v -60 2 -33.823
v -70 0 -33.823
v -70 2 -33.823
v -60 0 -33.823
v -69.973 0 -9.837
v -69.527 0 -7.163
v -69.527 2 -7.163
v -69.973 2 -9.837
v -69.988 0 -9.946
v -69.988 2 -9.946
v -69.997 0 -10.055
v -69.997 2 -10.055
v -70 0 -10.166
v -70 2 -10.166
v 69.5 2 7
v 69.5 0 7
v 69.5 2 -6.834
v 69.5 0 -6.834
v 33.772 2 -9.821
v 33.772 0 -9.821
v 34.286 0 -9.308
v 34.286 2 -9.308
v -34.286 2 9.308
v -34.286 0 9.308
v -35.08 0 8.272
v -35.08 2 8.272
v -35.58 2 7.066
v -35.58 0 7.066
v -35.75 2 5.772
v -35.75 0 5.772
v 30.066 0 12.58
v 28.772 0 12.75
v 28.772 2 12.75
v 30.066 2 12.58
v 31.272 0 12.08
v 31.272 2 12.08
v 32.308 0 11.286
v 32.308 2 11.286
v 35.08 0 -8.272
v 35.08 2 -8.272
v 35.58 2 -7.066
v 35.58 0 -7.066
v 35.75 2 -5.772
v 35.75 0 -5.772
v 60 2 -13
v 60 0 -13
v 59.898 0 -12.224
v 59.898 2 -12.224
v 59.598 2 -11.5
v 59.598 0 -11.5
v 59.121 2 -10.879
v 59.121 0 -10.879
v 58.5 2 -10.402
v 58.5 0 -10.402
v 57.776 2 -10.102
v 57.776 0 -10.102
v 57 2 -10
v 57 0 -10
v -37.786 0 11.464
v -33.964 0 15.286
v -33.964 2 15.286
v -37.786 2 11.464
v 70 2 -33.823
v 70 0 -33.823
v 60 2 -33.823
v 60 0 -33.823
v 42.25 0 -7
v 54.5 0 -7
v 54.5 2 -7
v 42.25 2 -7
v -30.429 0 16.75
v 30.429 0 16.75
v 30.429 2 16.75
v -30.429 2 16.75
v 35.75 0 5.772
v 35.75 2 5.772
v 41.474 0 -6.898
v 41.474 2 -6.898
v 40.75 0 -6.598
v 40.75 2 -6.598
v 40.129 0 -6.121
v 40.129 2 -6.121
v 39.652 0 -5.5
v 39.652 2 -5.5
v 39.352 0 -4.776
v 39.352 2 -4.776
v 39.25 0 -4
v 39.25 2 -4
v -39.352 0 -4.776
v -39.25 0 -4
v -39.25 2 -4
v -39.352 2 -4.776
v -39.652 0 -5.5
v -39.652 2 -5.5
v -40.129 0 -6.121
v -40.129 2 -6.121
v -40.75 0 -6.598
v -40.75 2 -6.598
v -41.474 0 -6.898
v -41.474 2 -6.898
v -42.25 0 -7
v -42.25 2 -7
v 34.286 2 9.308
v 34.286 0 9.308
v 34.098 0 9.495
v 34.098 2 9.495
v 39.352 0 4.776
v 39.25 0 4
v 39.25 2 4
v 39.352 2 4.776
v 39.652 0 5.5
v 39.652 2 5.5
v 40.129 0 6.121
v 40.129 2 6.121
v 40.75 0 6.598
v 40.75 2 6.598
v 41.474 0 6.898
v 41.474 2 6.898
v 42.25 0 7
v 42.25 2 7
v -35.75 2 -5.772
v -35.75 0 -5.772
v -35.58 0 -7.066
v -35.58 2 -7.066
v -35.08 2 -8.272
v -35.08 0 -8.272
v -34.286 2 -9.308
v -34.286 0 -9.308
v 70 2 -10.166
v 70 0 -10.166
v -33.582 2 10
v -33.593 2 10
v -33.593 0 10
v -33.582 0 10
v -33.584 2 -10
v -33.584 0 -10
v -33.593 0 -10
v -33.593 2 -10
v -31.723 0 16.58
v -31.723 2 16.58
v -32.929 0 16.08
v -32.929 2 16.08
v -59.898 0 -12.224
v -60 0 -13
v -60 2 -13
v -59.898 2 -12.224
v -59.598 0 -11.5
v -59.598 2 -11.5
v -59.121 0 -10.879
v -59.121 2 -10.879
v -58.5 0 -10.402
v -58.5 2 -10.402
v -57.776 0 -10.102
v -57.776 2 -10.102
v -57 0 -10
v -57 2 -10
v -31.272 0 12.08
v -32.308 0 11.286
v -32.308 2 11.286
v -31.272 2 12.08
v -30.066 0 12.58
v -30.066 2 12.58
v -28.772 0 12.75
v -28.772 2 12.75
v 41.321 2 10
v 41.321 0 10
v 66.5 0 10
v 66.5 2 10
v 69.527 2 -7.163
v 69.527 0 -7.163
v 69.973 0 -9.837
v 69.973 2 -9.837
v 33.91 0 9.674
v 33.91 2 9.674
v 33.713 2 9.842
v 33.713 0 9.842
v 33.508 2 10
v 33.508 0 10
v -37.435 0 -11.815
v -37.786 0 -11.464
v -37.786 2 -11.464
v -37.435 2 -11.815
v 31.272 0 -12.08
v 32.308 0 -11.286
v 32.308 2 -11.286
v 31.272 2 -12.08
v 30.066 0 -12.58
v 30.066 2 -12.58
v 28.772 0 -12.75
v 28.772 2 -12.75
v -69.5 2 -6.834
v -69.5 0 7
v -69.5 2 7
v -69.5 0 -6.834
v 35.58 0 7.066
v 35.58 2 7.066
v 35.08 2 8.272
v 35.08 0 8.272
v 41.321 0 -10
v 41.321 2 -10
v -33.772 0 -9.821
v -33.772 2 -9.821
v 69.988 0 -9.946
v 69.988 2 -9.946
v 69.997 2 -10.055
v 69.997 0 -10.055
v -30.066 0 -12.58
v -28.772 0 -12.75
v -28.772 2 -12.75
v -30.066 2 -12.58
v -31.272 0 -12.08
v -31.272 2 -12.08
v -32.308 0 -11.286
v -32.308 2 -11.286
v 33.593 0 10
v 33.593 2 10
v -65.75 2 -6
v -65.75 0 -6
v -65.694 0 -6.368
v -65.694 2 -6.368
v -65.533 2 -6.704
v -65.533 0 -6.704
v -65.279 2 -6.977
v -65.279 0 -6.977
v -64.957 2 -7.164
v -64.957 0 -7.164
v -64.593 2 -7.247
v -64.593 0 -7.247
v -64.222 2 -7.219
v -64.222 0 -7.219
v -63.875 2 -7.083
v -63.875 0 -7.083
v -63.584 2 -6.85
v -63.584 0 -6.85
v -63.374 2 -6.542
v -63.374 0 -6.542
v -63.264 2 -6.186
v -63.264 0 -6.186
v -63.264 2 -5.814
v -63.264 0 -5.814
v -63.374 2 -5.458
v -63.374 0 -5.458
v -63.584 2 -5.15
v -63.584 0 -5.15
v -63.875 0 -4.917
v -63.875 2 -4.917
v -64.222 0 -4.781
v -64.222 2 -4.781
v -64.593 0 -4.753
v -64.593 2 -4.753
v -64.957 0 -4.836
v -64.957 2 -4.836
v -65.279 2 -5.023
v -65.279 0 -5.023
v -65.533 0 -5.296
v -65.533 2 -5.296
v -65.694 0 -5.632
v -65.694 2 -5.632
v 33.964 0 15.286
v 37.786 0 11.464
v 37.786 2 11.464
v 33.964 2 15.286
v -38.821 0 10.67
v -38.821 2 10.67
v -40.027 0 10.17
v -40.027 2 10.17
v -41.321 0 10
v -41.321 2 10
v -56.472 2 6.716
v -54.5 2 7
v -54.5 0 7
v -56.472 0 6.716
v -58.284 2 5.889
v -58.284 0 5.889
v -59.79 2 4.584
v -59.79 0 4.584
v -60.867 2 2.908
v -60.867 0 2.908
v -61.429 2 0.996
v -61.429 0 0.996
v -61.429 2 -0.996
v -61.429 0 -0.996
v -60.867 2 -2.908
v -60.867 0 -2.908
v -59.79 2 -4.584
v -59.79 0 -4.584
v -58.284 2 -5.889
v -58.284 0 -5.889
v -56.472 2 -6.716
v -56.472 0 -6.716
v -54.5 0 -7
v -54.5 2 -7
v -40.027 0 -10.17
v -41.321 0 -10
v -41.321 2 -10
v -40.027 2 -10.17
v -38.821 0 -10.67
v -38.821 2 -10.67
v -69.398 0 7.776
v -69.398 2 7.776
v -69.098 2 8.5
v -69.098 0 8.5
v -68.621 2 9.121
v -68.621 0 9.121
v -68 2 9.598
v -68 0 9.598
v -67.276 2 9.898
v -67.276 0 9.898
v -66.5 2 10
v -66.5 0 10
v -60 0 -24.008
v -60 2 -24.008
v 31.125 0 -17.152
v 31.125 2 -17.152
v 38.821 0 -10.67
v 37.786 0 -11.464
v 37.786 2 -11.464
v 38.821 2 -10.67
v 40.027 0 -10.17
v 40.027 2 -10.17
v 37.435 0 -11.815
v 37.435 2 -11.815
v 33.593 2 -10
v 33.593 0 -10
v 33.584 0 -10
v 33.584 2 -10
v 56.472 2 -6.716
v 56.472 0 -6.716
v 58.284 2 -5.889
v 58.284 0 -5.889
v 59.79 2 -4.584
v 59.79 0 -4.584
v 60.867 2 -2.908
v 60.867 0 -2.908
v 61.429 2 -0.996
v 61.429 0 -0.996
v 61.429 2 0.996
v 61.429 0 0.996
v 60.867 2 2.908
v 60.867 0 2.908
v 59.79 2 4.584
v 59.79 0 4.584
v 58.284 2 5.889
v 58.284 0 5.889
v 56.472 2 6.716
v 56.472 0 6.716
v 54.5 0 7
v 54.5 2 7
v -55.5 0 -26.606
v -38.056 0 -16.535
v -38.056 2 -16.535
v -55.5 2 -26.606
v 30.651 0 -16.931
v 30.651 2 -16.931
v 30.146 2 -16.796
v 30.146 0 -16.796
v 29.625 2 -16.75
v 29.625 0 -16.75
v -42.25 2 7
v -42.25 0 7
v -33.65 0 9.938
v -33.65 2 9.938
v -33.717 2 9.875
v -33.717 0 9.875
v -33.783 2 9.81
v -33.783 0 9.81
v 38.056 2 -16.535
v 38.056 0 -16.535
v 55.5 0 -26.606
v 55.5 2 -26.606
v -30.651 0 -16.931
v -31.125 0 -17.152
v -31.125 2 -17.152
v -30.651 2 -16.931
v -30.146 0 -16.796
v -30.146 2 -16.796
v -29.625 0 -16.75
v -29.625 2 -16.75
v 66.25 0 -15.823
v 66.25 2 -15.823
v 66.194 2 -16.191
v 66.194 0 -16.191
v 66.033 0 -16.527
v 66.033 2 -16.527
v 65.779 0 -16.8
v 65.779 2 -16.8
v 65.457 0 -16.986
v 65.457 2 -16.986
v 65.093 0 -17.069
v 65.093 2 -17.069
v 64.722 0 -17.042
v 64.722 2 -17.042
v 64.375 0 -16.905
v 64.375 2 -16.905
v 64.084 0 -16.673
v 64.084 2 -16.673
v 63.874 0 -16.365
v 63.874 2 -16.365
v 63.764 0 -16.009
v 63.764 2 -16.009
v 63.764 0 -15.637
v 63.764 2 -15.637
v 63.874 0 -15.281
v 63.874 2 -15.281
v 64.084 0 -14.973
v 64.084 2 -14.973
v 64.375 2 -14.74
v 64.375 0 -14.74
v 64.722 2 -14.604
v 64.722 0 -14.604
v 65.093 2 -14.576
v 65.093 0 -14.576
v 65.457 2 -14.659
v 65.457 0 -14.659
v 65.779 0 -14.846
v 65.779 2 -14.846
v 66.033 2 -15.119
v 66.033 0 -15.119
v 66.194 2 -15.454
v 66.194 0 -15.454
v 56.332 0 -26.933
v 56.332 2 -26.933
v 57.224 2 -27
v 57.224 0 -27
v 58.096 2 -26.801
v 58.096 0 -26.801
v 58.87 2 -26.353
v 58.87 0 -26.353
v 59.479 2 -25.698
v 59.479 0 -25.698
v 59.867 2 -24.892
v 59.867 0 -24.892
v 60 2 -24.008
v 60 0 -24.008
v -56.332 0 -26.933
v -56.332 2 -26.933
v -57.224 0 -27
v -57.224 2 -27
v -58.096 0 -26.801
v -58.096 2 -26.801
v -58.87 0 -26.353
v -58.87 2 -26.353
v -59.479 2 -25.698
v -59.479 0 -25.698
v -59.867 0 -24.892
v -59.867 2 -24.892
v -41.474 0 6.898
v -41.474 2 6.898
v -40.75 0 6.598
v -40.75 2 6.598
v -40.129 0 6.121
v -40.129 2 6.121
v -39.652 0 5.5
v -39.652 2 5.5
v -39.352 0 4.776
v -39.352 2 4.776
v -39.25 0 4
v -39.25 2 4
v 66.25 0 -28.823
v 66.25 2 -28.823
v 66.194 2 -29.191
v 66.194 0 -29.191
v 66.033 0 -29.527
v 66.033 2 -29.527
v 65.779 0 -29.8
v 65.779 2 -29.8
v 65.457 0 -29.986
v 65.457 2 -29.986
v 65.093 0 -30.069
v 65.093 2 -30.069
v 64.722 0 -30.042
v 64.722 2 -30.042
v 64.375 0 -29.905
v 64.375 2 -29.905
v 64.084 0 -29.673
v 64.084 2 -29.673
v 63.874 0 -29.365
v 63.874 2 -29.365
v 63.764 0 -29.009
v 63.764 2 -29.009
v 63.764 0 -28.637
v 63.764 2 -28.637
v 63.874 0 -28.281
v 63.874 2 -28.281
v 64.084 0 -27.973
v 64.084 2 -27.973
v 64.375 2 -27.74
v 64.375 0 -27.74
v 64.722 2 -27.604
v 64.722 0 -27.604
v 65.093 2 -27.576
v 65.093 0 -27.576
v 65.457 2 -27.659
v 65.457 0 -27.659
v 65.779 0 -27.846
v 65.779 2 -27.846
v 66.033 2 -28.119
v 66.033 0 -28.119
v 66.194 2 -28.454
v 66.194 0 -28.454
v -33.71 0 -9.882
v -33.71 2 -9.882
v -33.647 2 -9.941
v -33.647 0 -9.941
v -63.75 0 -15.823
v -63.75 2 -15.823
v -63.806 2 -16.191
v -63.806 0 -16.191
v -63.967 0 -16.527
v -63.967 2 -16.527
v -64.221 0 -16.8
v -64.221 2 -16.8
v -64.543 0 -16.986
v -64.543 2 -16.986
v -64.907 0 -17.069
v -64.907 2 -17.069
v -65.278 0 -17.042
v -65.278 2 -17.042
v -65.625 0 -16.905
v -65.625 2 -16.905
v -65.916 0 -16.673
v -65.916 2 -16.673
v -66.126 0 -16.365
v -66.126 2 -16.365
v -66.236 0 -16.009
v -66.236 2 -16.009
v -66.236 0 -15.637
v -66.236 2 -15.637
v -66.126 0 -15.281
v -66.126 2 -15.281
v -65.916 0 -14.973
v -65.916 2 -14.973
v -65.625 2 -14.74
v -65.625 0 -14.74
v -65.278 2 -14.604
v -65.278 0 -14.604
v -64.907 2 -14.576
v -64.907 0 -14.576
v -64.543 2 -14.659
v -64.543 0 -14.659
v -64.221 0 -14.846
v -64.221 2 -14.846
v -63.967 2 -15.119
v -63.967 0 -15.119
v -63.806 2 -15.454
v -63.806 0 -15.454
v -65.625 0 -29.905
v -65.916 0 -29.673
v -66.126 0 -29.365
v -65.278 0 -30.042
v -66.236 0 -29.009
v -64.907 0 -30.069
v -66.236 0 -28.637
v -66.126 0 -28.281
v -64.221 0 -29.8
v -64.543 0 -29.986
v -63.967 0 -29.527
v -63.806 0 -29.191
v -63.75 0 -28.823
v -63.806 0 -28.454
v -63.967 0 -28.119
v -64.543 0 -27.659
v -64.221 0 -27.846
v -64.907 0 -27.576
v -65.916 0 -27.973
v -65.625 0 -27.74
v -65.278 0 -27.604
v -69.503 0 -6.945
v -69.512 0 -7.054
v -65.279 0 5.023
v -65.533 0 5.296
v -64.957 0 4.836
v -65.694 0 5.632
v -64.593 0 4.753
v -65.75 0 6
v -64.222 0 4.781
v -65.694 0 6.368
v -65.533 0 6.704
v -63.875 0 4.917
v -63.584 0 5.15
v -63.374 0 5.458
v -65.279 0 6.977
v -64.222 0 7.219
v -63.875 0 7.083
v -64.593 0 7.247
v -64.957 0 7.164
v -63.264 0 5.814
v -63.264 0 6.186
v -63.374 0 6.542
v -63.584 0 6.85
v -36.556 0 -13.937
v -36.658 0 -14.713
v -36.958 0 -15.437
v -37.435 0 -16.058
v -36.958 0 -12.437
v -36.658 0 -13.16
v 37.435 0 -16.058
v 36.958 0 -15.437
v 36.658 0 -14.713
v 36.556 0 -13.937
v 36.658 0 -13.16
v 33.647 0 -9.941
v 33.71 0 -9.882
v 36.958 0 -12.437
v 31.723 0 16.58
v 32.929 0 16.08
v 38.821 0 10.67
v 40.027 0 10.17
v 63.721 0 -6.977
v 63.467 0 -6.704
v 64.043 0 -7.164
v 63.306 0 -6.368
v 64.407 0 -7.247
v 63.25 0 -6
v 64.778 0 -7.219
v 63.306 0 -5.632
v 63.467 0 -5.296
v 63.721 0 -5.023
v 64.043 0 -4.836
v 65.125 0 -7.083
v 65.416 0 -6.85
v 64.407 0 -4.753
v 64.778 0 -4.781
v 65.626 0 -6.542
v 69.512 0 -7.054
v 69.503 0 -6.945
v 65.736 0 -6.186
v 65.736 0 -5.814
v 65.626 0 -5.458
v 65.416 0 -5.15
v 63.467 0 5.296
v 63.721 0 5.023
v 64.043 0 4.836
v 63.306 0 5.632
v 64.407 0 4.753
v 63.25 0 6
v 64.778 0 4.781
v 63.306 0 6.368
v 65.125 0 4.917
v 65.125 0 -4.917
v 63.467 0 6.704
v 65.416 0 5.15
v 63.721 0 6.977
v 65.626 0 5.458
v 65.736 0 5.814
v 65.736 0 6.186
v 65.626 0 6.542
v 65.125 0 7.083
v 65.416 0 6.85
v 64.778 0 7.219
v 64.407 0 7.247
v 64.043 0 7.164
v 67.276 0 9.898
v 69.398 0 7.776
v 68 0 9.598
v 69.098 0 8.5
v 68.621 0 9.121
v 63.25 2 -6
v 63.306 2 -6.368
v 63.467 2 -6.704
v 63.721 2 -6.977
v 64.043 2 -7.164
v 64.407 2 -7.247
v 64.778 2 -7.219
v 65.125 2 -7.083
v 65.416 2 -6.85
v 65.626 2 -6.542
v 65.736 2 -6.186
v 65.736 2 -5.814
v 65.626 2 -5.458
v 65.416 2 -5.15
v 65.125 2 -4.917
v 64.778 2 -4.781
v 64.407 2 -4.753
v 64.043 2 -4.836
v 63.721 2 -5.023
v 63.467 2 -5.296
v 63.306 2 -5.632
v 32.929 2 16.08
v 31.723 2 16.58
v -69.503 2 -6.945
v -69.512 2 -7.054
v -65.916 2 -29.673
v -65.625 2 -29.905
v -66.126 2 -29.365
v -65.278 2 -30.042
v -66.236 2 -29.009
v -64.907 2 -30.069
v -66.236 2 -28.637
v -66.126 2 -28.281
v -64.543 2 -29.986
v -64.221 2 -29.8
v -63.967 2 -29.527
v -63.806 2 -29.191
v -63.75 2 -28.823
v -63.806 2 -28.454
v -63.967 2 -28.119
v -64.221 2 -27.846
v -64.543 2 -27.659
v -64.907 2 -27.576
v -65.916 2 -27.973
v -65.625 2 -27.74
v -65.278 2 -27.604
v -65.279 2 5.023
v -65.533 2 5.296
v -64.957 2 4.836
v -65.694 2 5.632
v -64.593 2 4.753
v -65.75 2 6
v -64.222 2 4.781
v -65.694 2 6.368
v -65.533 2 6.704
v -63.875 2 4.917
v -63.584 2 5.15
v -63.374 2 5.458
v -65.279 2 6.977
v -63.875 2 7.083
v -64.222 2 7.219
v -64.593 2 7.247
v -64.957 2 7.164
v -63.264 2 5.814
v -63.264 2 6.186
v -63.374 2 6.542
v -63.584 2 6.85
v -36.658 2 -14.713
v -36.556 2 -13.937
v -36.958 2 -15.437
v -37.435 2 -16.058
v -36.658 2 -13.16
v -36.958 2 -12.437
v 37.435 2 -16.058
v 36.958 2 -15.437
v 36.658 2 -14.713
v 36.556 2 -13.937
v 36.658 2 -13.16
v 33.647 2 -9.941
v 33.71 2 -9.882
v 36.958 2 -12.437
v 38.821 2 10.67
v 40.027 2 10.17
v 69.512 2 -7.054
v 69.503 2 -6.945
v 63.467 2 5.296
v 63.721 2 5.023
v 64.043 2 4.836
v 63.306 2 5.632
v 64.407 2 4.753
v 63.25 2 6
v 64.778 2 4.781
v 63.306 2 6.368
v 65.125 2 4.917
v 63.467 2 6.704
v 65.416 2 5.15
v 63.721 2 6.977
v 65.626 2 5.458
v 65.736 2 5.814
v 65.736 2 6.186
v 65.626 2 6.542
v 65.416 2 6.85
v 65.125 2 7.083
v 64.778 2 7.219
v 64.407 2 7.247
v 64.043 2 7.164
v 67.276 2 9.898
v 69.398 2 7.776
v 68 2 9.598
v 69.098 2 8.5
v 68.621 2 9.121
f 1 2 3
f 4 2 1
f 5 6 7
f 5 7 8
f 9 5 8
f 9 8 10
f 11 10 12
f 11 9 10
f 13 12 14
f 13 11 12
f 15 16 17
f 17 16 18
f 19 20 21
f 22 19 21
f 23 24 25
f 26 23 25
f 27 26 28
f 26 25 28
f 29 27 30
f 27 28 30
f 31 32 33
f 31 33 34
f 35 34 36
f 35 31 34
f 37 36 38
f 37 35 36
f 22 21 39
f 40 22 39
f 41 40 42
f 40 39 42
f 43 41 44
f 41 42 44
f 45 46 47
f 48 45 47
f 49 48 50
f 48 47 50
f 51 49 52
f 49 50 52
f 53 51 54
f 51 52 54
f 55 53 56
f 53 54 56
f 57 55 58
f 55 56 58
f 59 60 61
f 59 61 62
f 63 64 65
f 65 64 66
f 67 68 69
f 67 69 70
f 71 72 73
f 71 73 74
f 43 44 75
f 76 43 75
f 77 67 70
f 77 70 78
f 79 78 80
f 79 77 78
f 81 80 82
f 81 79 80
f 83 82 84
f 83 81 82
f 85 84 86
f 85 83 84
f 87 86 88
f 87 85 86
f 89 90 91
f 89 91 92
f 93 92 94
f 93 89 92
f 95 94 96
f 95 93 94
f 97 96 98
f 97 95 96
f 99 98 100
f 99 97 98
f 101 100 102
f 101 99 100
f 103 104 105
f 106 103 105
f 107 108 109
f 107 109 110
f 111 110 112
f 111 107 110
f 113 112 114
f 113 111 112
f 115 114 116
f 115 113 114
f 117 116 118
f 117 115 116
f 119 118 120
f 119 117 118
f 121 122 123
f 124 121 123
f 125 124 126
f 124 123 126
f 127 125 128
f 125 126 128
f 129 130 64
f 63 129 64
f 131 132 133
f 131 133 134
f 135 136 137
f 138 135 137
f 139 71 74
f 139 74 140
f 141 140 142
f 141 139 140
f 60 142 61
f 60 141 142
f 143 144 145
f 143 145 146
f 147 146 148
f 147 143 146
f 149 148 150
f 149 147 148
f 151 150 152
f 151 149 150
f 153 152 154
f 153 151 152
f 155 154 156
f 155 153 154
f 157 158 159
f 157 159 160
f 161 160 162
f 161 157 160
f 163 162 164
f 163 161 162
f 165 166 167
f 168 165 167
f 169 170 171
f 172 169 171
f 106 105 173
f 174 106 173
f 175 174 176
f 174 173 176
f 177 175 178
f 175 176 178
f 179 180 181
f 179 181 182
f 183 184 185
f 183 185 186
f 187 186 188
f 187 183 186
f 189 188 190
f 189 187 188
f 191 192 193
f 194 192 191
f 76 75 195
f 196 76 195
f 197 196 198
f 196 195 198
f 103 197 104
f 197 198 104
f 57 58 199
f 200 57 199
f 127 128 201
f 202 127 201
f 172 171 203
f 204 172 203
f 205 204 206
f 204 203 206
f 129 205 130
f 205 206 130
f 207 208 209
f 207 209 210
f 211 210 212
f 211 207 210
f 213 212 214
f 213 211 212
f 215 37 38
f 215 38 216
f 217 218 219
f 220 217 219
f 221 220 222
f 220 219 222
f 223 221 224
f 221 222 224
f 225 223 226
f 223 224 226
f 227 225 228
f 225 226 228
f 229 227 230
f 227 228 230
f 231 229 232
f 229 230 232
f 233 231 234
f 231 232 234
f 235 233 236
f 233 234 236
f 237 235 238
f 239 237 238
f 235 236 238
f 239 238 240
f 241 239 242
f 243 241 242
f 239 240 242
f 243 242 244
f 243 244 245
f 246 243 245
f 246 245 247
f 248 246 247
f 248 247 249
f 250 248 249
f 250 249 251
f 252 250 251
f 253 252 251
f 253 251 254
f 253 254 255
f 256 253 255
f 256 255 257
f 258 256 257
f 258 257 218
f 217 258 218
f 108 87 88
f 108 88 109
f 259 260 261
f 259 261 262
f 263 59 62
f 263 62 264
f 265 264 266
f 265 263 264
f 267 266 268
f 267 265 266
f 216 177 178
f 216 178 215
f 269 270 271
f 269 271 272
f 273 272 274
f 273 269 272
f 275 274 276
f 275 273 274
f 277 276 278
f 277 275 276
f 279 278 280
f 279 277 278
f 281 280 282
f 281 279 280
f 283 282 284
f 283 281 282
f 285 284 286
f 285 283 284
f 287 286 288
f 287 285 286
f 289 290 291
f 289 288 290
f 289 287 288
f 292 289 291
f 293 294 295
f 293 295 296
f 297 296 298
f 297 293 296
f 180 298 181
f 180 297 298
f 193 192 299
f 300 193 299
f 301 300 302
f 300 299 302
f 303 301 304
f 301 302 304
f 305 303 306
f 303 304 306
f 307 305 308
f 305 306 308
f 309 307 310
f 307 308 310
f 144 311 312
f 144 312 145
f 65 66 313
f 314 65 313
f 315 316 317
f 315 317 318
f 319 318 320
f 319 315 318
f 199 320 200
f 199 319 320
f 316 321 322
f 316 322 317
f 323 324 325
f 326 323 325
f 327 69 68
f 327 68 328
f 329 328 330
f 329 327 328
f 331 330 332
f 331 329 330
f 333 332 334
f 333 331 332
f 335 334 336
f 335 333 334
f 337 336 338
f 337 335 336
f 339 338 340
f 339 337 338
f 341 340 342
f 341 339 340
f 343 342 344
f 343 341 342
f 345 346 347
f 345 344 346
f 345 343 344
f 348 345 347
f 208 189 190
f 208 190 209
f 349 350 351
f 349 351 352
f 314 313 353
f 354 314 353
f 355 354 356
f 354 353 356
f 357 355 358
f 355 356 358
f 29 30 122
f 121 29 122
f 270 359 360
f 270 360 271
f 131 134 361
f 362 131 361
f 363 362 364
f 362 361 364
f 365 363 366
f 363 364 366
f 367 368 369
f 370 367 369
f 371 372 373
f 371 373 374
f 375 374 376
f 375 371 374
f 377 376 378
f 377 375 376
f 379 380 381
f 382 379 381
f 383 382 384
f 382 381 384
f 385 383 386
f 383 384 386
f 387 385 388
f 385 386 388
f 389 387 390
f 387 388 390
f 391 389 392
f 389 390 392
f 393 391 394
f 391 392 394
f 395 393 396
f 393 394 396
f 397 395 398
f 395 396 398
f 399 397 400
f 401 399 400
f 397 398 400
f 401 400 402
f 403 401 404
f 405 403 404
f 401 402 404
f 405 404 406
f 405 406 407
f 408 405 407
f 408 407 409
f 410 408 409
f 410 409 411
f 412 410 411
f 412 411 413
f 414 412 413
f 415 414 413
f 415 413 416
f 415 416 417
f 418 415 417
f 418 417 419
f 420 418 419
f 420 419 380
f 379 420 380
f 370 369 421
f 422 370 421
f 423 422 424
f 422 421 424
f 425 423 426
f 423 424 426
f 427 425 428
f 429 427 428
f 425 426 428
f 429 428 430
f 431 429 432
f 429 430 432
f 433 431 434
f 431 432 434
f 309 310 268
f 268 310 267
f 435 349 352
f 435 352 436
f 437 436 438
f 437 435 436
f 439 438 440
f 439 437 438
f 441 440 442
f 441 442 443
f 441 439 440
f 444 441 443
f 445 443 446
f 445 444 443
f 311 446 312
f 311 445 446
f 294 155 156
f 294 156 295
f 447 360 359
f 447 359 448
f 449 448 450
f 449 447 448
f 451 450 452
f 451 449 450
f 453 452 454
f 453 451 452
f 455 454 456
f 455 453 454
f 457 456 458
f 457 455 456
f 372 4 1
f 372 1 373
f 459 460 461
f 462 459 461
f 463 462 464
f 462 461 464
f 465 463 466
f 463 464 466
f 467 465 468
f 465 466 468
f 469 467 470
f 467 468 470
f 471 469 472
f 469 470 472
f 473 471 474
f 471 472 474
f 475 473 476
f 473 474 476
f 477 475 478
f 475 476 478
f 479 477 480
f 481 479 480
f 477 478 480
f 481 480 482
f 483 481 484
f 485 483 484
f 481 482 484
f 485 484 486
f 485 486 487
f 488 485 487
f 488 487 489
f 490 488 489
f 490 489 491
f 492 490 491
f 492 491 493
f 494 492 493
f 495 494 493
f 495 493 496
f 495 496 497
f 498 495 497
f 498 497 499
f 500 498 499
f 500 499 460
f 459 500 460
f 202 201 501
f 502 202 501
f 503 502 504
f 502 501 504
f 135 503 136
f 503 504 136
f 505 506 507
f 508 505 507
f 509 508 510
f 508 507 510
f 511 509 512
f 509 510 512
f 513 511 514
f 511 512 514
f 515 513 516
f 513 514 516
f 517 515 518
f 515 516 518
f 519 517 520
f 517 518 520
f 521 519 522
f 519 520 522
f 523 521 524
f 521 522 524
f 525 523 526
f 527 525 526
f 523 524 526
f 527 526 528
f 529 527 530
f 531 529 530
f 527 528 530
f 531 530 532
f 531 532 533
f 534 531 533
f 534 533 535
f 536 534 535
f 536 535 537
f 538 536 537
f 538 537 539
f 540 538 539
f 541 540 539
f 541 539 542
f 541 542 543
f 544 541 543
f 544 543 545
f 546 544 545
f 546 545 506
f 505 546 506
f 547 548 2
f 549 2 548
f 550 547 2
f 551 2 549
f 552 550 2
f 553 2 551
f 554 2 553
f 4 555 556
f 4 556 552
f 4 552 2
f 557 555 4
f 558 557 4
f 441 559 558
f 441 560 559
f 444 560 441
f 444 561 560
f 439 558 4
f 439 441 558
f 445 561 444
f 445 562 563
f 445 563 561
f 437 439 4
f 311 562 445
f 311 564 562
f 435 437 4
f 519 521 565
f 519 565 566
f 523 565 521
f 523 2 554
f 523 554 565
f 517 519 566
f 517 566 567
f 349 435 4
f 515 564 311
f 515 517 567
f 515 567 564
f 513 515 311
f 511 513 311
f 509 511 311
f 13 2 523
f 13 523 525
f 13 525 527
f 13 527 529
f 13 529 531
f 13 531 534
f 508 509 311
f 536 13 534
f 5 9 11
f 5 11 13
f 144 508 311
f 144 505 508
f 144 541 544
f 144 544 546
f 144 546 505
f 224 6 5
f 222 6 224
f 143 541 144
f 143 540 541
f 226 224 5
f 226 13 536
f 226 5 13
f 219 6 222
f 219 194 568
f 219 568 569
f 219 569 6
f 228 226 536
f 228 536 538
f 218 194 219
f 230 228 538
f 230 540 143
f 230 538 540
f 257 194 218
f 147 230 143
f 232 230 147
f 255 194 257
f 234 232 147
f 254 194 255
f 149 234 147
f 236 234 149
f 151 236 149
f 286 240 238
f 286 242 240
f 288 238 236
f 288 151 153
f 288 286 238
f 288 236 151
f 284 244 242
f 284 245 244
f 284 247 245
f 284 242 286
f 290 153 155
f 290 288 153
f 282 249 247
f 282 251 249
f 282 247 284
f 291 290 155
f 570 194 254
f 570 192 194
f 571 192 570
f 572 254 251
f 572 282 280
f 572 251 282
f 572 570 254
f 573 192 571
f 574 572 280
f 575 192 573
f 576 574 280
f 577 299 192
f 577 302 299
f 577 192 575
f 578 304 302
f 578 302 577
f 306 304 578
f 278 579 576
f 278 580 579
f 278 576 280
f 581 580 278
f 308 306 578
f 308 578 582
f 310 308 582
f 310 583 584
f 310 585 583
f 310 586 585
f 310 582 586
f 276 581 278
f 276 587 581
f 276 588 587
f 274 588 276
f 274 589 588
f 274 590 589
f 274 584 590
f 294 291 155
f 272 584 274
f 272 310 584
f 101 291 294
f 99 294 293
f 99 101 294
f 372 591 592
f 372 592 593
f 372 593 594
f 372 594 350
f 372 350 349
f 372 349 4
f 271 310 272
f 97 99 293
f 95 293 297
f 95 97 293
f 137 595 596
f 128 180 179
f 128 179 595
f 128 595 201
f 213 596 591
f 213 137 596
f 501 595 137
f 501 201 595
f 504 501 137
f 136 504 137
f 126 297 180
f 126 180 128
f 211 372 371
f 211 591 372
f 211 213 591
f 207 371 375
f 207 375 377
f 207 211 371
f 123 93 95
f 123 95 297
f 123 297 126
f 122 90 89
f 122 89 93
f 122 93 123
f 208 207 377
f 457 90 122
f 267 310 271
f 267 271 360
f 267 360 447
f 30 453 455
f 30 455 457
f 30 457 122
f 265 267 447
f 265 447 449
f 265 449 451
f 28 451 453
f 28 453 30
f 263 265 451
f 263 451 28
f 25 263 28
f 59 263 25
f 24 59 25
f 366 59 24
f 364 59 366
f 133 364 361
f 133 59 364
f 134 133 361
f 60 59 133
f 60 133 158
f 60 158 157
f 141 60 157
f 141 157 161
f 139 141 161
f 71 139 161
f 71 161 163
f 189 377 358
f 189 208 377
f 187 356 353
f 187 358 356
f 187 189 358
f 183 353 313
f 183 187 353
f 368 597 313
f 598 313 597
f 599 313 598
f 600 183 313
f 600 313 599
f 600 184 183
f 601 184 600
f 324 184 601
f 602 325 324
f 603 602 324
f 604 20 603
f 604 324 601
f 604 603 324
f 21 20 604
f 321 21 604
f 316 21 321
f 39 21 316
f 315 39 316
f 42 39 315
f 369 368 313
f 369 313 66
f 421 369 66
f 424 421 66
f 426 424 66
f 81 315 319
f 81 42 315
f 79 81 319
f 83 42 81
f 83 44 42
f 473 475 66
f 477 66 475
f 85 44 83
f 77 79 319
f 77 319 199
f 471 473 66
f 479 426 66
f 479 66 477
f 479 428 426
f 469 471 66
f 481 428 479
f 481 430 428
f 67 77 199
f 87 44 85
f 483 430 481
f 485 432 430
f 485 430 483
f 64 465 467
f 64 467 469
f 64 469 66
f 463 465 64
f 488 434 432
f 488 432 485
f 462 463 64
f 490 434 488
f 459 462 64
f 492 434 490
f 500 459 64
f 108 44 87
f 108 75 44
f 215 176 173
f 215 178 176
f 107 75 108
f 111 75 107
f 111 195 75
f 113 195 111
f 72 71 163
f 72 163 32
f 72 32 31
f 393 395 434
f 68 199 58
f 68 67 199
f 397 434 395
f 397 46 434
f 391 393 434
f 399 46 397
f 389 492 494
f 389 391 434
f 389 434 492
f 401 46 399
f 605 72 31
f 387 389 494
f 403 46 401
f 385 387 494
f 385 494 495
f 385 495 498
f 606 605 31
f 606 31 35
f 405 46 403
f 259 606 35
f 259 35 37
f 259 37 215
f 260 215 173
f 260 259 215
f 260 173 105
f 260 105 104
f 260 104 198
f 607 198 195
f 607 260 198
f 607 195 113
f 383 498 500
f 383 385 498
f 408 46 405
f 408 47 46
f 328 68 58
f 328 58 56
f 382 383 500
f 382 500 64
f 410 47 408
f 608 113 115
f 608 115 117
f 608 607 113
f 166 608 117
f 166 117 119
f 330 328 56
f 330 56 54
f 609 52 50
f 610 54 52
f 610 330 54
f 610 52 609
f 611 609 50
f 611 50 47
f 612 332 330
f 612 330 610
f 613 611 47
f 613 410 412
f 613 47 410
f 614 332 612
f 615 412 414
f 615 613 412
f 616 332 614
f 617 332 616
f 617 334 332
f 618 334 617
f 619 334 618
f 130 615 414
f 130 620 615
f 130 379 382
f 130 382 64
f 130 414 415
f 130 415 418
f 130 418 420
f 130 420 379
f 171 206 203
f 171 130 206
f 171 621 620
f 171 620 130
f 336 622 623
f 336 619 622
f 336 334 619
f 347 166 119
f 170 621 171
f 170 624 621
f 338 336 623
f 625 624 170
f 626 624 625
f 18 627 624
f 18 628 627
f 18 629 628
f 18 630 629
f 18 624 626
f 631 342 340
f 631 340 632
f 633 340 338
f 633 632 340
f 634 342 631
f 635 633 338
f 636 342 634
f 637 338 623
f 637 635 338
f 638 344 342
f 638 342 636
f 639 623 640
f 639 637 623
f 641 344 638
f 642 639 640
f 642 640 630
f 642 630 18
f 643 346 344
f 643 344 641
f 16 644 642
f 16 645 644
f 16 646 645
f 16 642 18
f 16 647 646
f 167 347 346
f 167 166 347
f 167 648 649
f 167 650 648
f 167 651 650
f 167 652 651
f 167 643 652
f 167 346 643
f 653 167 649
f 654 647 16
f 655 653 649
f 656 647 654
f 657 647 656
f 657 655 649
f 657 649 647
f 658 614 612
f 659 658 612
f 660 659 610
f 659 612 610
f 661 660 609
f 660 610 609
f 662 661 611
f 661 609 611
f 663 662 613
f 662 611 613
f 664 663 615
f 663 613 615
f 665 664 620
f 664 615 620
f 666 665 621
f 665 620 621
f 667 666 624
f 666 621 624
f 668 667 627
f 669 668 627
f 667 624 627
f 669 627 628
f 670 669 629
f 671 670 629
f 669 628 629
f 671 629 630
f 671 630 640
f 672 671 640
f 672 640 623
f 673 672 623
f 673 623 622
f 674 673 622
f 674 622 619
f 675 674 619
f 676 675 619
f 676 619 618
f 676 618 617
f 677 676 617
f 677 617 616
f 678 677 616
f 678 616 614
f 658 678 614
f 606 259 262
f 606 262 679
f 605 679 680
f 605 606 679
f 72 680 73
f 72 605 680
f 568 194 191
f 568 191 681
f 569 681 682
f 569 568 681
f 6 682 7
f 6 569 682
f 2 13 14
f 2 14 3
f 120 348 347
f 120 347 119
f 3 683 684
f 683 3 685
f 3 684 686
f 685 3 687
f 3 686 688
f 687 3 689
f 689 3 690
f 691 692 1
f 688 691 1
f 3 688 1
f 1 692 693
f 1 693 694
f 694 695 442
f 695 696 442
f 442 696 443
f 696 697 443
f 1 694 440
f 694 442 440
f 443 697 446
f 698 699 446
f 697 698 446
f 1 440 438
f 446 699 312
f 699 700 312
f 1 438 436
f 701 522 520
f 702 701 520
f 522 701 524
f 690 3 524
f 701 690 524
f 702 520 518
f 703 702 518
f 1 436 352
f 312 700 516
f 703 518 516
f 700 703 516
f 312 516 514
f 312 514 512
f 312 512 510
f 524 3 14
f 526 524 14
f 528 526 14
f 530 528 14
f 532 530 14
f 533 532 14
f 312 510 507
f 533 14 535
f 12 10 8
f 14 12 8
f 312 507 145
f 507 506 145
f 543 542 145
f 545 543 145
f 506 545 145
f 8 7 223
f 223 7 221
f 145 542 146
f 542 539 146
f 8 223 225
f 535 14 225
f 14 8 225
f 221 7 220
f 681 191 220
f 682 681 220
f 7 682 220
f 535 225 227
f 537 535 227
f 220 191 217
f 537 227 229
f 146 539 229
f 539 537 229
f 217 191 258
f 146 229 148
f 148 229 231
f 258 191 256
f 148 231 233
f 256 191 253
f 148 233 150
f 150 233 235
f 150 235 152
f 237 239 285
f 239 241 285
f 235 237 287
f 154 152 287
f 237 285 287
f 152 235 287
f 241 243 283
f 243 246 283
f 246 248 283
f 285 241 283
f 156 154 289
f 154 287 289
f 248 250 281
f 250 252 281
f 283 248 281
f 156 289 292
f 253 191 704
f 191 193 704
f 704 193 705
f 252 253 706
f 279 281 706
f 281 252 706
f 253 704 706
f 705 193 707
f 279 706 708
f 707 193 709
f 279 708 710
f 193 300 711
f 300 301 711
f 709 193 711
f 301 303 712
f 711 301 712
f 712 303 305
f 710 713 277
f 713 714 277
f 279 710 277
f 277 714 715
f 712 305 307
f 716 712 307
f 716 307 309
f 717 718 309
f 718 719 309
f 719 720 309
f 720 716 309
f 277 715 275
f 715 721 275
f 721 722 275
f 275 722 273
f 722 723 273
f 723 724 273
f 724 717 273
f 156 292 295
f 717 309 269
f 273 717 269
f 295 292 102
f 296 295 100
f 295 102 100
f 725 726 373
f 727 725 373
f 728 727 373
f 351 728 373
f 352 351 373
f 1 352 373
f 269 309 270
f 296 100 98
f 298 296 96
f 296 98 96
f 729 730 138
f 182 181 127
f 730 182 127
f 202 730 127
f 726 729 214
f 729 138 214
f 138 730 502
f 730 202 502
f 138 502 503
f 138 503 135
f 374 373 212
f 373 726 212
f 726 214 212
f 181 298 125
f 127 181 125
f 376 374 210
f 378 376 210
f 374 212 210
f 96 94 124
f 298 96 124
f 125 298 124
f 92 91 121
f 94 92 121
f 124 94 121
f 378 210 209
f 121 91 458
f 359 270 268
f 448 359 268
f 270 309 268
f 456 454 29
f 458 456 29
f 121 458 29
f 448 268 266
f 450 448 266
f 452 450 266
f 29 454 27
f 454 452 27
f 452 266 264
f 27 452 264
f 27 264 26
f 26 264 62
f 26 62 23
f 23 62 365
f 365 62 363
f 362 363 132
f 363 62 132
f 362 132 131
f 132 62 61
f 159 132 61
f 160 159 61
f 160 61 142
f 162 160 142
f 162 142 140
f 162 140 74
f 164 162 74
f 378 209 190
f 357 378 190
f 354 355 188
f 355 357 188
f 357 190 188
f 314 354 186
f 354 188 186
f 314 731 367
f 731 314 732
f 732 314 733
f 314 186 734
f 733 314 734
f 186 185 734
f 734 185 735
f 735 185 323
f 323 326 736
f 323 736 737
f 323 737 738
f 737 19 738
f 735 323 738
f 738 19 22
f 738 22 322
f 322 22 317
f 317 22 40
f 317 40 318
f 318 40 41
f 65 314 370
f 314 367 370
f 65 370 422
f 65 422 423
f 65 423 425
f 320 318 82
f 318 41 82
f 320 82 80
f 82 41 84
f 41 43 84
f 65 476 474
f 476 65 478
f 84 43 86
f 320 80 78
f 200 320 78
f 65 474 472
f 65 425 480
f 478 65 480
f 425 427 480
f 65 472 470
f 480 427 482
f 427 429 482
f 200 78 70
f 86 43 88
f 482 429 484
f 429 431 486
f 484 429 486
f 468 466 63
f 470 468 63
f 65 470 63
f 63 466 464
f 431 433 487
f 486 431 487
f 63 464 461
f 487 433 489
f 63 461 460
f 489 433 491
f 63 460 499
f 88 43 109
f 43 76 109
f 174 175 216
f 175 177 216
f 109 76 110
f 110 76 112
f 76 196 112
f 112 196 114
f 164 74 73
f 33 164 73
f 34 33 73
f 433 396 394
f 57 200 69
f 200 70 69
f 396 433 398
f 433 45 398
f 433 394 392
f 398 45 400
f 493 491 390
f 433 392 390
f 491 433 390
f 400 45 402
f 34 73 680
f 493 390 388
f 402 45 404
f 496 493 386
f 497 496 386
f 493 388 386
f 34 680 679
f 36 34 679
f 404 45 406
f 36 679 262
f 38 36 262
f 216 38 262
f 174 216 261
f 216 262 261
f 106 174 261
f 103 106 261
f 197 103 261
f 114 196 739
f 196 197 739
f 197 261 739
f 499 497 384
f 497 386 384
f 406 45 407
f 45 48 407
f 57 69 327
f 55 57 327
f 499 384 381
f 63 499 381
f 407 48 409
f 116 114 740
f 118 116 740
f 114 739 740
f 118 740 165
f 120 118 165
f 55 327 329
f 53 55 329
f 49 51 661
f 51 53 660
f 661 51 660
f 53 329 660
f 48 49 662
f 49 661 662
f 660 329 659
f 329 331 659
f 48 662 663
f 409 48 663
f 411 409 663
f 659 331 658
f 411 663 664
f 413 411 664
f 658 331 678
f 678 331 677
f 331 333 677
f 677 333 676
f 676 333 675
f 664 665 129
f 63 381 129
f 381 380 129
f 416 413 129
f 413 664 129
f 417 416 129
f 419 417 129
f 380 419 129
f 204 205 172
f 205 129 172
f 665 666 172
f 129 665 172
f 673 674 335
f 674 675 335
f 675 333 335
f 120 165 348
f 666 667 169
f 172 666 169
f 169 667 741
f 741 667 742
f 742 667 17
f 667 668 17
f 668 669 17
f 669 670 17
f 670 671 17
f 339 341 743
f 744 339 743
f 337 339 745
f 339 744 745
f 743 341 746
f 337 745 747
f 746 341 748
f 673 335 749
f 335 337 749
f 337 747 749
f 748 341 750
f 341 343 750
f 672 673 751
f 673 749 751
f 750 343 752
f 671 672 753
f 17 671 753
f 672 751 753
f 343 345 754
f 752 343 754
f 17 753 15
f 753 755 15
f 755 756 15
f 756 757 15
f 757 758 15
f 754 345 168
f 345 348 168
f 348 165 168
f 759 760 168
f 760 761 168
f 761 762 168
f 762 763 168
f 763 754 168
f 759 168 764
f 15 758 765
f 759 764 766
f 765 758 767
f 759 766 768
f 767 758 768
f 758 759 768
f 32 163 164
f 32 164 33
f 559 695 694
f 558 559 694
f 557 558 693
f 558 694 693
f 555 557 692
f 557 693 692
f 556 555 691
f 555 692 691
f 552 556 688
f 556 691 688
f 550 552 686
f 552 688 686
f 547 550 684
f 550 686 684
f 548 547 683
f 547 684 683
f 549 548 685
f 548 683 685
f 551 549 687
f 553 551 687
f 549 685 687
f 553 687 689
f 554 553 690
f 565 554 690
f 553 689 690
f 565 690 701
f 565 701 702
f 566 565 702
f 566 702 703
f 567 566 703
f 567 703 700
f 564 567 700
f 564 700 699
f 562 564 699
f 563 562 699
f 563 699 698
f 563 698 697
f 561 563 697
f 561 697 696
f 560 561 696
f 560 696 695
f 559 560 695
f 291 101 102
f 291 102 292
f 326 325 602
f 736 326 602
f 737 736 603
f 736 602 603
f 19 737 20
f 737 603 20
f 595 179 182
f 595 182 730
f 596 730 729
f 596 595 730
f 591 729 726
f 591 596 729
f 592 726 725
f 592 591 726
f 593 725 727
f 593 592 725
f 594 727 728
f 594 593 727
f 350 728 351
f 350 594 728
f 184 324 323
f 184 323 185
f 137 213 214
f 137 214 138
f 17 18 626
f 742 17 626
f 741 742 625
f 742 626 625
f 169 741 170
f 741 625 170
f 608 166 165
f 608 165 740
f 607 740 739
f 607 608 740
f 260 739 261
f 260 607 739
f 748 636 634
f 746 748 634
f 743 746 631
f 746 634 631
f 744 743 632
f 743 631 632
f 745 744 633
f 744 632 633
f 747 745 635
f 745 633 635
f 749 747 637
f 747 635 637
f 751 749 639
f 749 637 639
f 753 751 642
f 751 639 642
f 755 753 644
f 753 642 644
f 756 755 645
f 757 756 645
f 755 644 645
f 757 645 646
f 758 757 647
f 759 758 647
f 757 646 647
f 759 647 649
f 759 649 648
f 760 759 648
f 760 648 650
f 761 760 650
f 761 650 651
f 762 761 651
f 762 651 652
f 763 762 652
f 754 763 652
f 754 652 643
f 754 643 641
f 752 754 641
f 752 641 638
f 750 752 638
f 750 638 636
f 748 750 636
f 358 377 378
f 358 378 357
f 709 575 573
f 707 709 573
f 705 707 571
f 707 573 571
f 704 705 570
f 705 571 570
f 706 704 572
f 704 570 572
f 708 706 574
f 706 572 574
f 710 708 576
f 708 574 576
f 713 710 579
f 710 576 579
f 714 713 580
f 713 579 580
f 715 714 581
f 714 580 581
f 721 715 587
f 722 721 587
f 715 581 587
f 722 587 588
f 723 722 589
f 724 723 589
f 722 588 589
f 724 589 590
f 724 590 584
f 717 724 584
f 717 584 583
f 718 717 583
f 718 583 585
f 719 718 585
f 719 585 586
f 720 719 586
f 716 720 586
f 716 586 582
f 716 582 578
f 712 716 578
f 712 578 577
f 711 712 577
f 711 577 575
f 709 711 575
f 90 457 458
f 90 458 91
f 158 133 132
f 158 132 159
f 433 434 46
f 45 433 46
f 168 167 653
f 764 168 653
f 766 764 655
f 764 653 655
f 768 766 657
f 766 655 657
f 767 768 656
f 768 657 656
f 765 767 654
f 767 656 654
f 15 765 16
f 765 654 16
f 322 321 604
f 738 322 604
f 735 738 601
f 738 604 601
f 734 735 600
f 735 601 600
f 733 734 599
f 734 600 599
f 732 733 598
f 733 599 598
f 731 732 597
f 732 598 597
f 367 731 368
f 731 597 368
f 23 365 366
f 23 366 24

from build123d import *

# Parameters (mm, degrees)
EXTRUDE_1_DEPTH          = 2
HOLE_WIZARD_1_D          = 2.5
CUT_EXTRUDE_1_DEPTH      = 71.244216844
EXTRUDE_2_DEPTH          = 2
CUT_EXTRUDE_2_DEPTH      = 71.244216844
CUT_EXTRUDE_2_DEPTH_BACK = 71.244216844
EXTRUDE_3_DEPTH          = 2
CUT_EXTRUDE_3_DEPTH      = 72.517917335
CUT_EXTRUDE_3_DEPTH_BACK = 72.517917335
EXTRUDE_4_DEPTH          = 2
HOLE_WIZARD_2_D          = 2.5


with BuildPart() as part:
    # 草图1 → 凸台-拉伸1 (new body)
    with BuildSketch(Plane(origin=(0, 0, 0), x_dir=(1, 0, 0), z_dir=(0, 1, 0))):
        with BuildLine():
            Line((66.5, 10), (-66.5, 10))
            ThreePointArc((-66.5, 10), (-68.621320344, 9.121320344), (-69.5, 7))
            Line((-69.5, 7), (-69.5, -7))
            ThreePointArc((-69.5, -7), (-68.621320344, -9.121320344), (-66.5, -10))
            Line((-66.5, -10), (66.5, -10))
            ThreePointArc((66.5, -10), (68.621320344, -9.121320344), (69.5, -7))
            Line((69.5, -7), (69.5, 7))
            ThreePointArc((69.5, 7), (68.621320344, 9.121320344), (66.5, 10))
        make_face()
    extrude(amount=EXTRUDE_1_DEPTH)

    # 孔1 (through all)
    with Locations(Plane(origin=(0, 2, 0), x_dir=(1, 0, 0), z_dir=(0, 1, 0))):
        with Locations((-64.5, 6), (-64.5, -6), (64.5, -6), (64.5, 6)):
            Hole(HOLE_WIZARD_1_D / 2)

    # 草图5 → 切除-拉伸1 (cut, through all)
    with BuildSketch(Plane(origin=(0, 2, 0), x_dir=(1, 0, 0), z_dir=(0, 1, 0))):
        with BuildLine():
            Line((-54.5, 7), (54.5, 7))
            ThreePointArc((54.5, 7), (61.5, 0), (54.5, -7))
            Line((54.5, -7), (-54.5, -7))
            ThreePointArc((-54.5, -7), (-61.5, 0), (-54.5, 7))
        make_face()
    extrude(amount=-CUT_EXTRUDE_1_DEPTH, mode=Mode.SUBTRACT)

    # 草图6 → 凸台-拉伸2 (add)
    with BuildSketch(Plane.XZ):
        with BuildLine():
            Line((-39.249952973, -9.999988019), (39.249952973, -9.999988019))
            Line((39.249952973, -9.999988019), (46.785993788, -7))
            Line((46.785993788, -7), (42.25, -7))
            ThreePointArc((42.25, -7), (40.128679656, -6.121320344), (39.25, -4))
            Line((39.25, -4), (39.25, 4))
            ThreePointArc((39.25, 4), (40.128679656, 6.121320344), (42.25, 7))
            Line((42.25, 7), (46.785993788, 7))
            Line((46.785993788, 7), (39.25, 10))
            Line((39.25, 10), (-39.25, 10))
            Line((-39.25, 10), (-46.786070913, 7))
            Line((-46.786070913, 7), (-42.25, 7))
            ThreePointArc((-42.25, 7), (-40.128679656, 6.121320344), (-39.25, 4))
            Line((-39.25, 4), (-39.25, -4))
            ThreePointArc((-39.25, -4), (-40.128679656, -6.121320344), (-42.25, -7))
            Line((-42.25, -7), (-46.49444439, -7))
            Line((-46.49444439, -7), (-39.249952973, -9.999988019))
        make_face()
    extrude(amount=-EXTRUDE_2_DEPTH)

    # 草图7 → 切除-拉伸2 (cut, two sides: drawn at the far end of the back side and taken through both)
    with BuildSketch(Plane.XZ.offset(-CUT_EXTRUDE_2_DEPTH_BACK)):
        with BuildLine():
            Line((34.25, -1.5), (-34.25, -1.5))
            ThreePointArc((-34.25, -1.5), (-35.75, 0), (-34.25, 1.5))
            Line((-34.25, 1.5), (34.25, 1.5))
            ThreePointArc((34.25, 1.5), (35.75, 0), (34.25, -1.5))
        make_face()
        with BuildLine():
            Line((34.25, 4), (-34.25, 4))
            ThreePointArc((-34.25, 4), (-35.75, 5.5), (-34.25, 7))
            Line((-34.25, 7), (34.25, 7))
            ThreePointArc((34.25, 7), (35.75, 5.5), (34.25, 4))
        make_face()
        with BuildLine():
            Line((34.25, -7), (-34.25, -7))
            ThreePointArc((-34.25, -7), (-35.75, -5.5), (-34.25, -4))
            Line((-34.25, -4), (34.25, -4))
            ThreePointArc((34.25, -4), (35.75, -5.5), (34.25, -7))
        make_face()
    extrude(amount=CUT_EXTRUDE_2_DEPTH + CUT_EXTRUDE_2_DEPTH_BACK, mode=Mode.SUBTRACT)

    # 草图9 → 凸台-拉伸3 (add)
    with BuildSketch(Plane(origin=(0, 0, 0), x_dir=(-1, 0, 0), z_dir=(0, -1, 0))):
        with BuildLine():
            ThreePointArc((37.785533906, -11.464466094), (39.40765065, -10.380602337), (41.321067812, -10))
            Line((41.321067812, -10), (39.25, -10))
            Line((39.25, -10), (33.593145751, -10))
            Line((33.593145751, -10), (32.307611845, -11.285533906))
            ThreePointArc((32.307611845, -11.285533906), (30.6854951, -12.369397663), (28.772077939, -12.75))
            Line((28.772077939, -12.75), (-28.772077939, -12.75))
            ThreePointArc((-28.772077939, -12.75), (-30.6854951, -12.369397663), (-32.307611845, -11.285533906))
            Line((-32.307611845, -11.285533906), (-33.593145751, -10))
            Line((-33.593145751, -10), (-39.25, -10))
            Line((-39.25, -10), (-41.321067812, -10))
            ThreePointArc((-41.321067812, -10), (-39.40765065, -10.380602337), (-37.785533906, -11.464466094))
            Line((-37.785533906, -11.464466094), (-33.964466094, -15.285533906))
            ThreePointArc((-33.964466094, -15.285533906), (-32.34234935, -16.369397663), (-30.428932188, -16.75))
            Line((-30.428932188, -16.75), (30.428932188, -16.75))
            ThreePointArc((30.428932188, -16.75), (32.34234935, -16.369397663), (33.964466094, -15.285533906))
            Line((33.964466094, -15.285533906), (37.785533906, -11.464466094))
        make_face()
        with BuildLine():
            Line((32.307611845, 11.285533906), (33.593145751, 10))
            Line((33.593145751, 10), (39.25, 10))
            Line((39.25, 10), (41.321067812, 10))
            ThreePointArc((41.321067812, 10), (39.40765065, 10.380602337), (37.785533906, 11.464466094))
            Line((37.785533906, 11.464466094), (33.964466094, 15.285533906))
            ThreePointArc((33.964466094, 15.285533906), (32.34234935, 16.369397663), (30.428932188, 16.75))
            Line((30.428932188, 16.75), (-30.428932188, 16.75))
            ThreePointArc((-30.428932188, 16.75), (-32.34234935, 16.369397663), (-33.964466094, 15.285533906))
            Line((-33.964466094, 15.285533906), (-37.785533906, 11.464466094))
            ThreePointArc((-37.785533906, 11.464466094), (-39.40765065, 10.380602337), (-41.321067812, 10))
            Line((-41.321067812, 10), (-39.25, 10))
            Line((-39.25, 10), (-33.593145751, 10))
            Line((-33.593145751, 10), (-32.307611845, 11.285533906))
            ThreePointArc((-32.307611845, 11.285533906), (-30.6854951, 12.369397663), (-28.772077939, 12.75))
            Line((-28.772077939, 12.75), (28.772077939, 12.75))
            ThreePointArc((28.772077939, 12.75), (30.6854951, 12.369397663), (32.307611845, 11.285533906))
        make_face()
    extrude(amount=-EXTRUDE_3_DEPTH)

    # 草图10 → 切除-拉伸3 (cut, two sides: drawn at the far end of the back side and taken through both)
    with BuildSketch(Plane(origin=(0, 2, 0), x_dir=(1, 0, 0), z_dir=(0, 1, 0)).offset(-CUT_EXTRUDE_3_DEPTH_BACK)):
        with BuildLine():
            Line((34.285533906, -9.307611845), (34.098025299, -9.495120452))
            ThreePointArc((34.098025299, -9.495120452), (32.487874075, -10.574009752), (30.588407989, -10.959519378))
            Line((30.588407989, -10.959519378), (-30.221374051, -11.274720124))
            ThreePointArc((-30.221374051, -11.274720124), (-32.148729436, -10.899128383), (-33.782824553, -9.810321198))
            Line((-33.782824553, -9.810321198), (-34.285533906, -9.307611845))
            ThreePointArc((-34.285533906, -9.307611845), (-35.369397663, -7.6854951), (-35.75, -5.772077939))
            Line((-35.75, -5.772077939), (-35.75, 5.772077939))
            ThreePointArc((-35.75, 5.772077939), (-35.369397663, 7.6854951), (-34.285533906, 9.307611845))
            Line((-34.285533906, 9.307611845), (-33.772077939, 9.821067812))
            ThreePointArc((-33.772077939, 9.821067812), (-32.149961195, 10.904931568), (-30.236544033, 11.285533906))
            Line((-30.236544033, 11.285533906), (30.236544033, 11.285533906))
            ThreePointArc((30.236544033, 11.285533906), (32.149961195, 10.904931568), (33.772077939, 9.821067812))
            Line((33.772077939, 9.821067812), (34.285533906, 9.307611845))
            ThreePointArc((34.285533906, 9.307611845), (35.369397663, 7.6854951), (35.75, 5.772077939))
            Line((35.75, 5.772077939), (35.75, -5.772077939))
            ThreePointArc((35.75, -5.772077939), (35.369397663, -7.6854951), (34.285533906, -9.307611845))
        make_face()
    extrude(amount=CUT_EXTRUDE_3_DEPTH + CUT_EXTRUDE_3_DEPTH_BACK, mode=Mode.SUBTRACT)

    # 草图11 → 凸台-拉伸4 (add)
    with BuildSketch(Plane.XZ):
        with BuildLine():
            Line((-70, -10.165525061), (-70, -33.822863961))
            Line((-70, -33.822863961), (-60, -33.822863961))
            Line((-60, -33.822863961), (-31.125084611, -17.151923789))
            ThreePointArc((-31.125084611, -17.151923789), (-30.401541746, -16.852222521), (-29.625084611, -16.75))
            Line((-29.625084611, -16.75), (-21.789130896, -16.75))
            Line((-21.789130896, -16.75), (-32.229816093, -13.630777579))
            Line((-32.229816093, -13.630777579), (-39.940851874, -9.309148126))
            Line((-39.940851874, -9.309148126), (-37.434698294, -11.815301706))
            ThreePointArc((-37.434698294, -11.815301706), (-36.581684053, -14.328200626), (-38.056018637, -16.534698261))
            Line((-38.056018637, -16.534698261), (-55.5, -26.605985597))
            ThreePointArc((-55.5, -26.605985597), (-58.5, -26.605985597), (-60, -24.007909385))
            Line((-60, -24.007909385), (-60, -13))
            ThreePointArc((-60, -13), (-59.121320344, -10.878679656), (-57, -10))
            Line((-57, -10), (-53.184301675, -10))
            Line((-53.184301675, -10), (-53.184301675, -8.509493359))
            Line((-53.184301675, -8.509493359), (-68.301691744, -8.509493359))
            Line((-68.301691744, -8.509493359), (-69.5, -3.184578382))
            Line((-69.5, -3.184578382), (-69.5, -6.834474939))
            ThreePointArc((-69.5, -6.834474939), (-69.506814648, -6.999436002), (-69.527212152, -7.163272914))
            Line((-69.527212152, -7.163272914), (-69.972787848, -9.836727086))
            ThreePointArc((-69.972787848, -9.836727086), (-69.993185352, -10.000563998), (-70, -10.165525061))
        make_face()
        with BuildLine():
            Line((68.301691744, -8.509493359), (69.5, -3.534682622))
            Line((69.5, -3.534682622), (69.5, -6.834474939))
            ThreePointArc((69.5, -6.834474939), (69.506814648, -6.999436002), (69.527212152, -7.163272914))
            Line((69.527212152, -7.163272914), (69.972787848, -9.836727086))
            ThreePointArc((69.972787848, -9.836727086), (69.993185352, -10.000563998), (70, -10.165525061))
            Line((70, -10.165525061), (70, -33.822863961))
            Line((70, -33.822863961), (60, -33.822863961))
            Line((60, -33.822863961), (31.125084611, -17.151923789))
            ThreePointArc((31.125084611, -17.151923789), (30.401541746, -16.852222521), (29.625084611, -16.75))
            Line((29.625084611, -16.75), (21.789130896, -16.75))
            Line((21.789130896, -16.75), (32.229816093, -13.630777579))
            Line((32.229816093, -13.630777579), (39.940851874, -9.309148126))
            Line((39.940851874, -9.309148126), (37.434698294, -11.815301706))
            ThreePointArc((37.434698294, -11.815301706), (36.581684053, -14.328200626), (38.056018637, -16.534698261))
            Line((38.056018637, -16.534698261), (55.5, -26.605985597))
            ThreePointArc((55.5, -26.605985597), (58.5, -26.605985597), (60, -24.007909385))
            Line((60, -24.007909385), (60, -13))
            ThreePointArc((60, -13), (59.121320344, -10.878679656), (57, -10))
            Line((57, -10), (53.184301675, -10))
            Line((53.184301675, -10), (53.184301675, -8.509493359))
            Line((53.184301675, -8.509493359), (68.301691744, -8.509493359))
        make_face()
    extrude(amount=-EXTRUDE_4_DEPTH)

    # 孔2 (through all)
    with Locations(Plane(origin=(0, 0, 0), x_dir=(-1, 0, 0), z_dir=(0, -1, 0))):
        with Locations((65, 15.822863961), (65, 28.822863961), (-65, 15.822863961), (-65, 28.822863961)):
            Hole(HOLE_WIZARD_2_D / 2)


solid = part.part
